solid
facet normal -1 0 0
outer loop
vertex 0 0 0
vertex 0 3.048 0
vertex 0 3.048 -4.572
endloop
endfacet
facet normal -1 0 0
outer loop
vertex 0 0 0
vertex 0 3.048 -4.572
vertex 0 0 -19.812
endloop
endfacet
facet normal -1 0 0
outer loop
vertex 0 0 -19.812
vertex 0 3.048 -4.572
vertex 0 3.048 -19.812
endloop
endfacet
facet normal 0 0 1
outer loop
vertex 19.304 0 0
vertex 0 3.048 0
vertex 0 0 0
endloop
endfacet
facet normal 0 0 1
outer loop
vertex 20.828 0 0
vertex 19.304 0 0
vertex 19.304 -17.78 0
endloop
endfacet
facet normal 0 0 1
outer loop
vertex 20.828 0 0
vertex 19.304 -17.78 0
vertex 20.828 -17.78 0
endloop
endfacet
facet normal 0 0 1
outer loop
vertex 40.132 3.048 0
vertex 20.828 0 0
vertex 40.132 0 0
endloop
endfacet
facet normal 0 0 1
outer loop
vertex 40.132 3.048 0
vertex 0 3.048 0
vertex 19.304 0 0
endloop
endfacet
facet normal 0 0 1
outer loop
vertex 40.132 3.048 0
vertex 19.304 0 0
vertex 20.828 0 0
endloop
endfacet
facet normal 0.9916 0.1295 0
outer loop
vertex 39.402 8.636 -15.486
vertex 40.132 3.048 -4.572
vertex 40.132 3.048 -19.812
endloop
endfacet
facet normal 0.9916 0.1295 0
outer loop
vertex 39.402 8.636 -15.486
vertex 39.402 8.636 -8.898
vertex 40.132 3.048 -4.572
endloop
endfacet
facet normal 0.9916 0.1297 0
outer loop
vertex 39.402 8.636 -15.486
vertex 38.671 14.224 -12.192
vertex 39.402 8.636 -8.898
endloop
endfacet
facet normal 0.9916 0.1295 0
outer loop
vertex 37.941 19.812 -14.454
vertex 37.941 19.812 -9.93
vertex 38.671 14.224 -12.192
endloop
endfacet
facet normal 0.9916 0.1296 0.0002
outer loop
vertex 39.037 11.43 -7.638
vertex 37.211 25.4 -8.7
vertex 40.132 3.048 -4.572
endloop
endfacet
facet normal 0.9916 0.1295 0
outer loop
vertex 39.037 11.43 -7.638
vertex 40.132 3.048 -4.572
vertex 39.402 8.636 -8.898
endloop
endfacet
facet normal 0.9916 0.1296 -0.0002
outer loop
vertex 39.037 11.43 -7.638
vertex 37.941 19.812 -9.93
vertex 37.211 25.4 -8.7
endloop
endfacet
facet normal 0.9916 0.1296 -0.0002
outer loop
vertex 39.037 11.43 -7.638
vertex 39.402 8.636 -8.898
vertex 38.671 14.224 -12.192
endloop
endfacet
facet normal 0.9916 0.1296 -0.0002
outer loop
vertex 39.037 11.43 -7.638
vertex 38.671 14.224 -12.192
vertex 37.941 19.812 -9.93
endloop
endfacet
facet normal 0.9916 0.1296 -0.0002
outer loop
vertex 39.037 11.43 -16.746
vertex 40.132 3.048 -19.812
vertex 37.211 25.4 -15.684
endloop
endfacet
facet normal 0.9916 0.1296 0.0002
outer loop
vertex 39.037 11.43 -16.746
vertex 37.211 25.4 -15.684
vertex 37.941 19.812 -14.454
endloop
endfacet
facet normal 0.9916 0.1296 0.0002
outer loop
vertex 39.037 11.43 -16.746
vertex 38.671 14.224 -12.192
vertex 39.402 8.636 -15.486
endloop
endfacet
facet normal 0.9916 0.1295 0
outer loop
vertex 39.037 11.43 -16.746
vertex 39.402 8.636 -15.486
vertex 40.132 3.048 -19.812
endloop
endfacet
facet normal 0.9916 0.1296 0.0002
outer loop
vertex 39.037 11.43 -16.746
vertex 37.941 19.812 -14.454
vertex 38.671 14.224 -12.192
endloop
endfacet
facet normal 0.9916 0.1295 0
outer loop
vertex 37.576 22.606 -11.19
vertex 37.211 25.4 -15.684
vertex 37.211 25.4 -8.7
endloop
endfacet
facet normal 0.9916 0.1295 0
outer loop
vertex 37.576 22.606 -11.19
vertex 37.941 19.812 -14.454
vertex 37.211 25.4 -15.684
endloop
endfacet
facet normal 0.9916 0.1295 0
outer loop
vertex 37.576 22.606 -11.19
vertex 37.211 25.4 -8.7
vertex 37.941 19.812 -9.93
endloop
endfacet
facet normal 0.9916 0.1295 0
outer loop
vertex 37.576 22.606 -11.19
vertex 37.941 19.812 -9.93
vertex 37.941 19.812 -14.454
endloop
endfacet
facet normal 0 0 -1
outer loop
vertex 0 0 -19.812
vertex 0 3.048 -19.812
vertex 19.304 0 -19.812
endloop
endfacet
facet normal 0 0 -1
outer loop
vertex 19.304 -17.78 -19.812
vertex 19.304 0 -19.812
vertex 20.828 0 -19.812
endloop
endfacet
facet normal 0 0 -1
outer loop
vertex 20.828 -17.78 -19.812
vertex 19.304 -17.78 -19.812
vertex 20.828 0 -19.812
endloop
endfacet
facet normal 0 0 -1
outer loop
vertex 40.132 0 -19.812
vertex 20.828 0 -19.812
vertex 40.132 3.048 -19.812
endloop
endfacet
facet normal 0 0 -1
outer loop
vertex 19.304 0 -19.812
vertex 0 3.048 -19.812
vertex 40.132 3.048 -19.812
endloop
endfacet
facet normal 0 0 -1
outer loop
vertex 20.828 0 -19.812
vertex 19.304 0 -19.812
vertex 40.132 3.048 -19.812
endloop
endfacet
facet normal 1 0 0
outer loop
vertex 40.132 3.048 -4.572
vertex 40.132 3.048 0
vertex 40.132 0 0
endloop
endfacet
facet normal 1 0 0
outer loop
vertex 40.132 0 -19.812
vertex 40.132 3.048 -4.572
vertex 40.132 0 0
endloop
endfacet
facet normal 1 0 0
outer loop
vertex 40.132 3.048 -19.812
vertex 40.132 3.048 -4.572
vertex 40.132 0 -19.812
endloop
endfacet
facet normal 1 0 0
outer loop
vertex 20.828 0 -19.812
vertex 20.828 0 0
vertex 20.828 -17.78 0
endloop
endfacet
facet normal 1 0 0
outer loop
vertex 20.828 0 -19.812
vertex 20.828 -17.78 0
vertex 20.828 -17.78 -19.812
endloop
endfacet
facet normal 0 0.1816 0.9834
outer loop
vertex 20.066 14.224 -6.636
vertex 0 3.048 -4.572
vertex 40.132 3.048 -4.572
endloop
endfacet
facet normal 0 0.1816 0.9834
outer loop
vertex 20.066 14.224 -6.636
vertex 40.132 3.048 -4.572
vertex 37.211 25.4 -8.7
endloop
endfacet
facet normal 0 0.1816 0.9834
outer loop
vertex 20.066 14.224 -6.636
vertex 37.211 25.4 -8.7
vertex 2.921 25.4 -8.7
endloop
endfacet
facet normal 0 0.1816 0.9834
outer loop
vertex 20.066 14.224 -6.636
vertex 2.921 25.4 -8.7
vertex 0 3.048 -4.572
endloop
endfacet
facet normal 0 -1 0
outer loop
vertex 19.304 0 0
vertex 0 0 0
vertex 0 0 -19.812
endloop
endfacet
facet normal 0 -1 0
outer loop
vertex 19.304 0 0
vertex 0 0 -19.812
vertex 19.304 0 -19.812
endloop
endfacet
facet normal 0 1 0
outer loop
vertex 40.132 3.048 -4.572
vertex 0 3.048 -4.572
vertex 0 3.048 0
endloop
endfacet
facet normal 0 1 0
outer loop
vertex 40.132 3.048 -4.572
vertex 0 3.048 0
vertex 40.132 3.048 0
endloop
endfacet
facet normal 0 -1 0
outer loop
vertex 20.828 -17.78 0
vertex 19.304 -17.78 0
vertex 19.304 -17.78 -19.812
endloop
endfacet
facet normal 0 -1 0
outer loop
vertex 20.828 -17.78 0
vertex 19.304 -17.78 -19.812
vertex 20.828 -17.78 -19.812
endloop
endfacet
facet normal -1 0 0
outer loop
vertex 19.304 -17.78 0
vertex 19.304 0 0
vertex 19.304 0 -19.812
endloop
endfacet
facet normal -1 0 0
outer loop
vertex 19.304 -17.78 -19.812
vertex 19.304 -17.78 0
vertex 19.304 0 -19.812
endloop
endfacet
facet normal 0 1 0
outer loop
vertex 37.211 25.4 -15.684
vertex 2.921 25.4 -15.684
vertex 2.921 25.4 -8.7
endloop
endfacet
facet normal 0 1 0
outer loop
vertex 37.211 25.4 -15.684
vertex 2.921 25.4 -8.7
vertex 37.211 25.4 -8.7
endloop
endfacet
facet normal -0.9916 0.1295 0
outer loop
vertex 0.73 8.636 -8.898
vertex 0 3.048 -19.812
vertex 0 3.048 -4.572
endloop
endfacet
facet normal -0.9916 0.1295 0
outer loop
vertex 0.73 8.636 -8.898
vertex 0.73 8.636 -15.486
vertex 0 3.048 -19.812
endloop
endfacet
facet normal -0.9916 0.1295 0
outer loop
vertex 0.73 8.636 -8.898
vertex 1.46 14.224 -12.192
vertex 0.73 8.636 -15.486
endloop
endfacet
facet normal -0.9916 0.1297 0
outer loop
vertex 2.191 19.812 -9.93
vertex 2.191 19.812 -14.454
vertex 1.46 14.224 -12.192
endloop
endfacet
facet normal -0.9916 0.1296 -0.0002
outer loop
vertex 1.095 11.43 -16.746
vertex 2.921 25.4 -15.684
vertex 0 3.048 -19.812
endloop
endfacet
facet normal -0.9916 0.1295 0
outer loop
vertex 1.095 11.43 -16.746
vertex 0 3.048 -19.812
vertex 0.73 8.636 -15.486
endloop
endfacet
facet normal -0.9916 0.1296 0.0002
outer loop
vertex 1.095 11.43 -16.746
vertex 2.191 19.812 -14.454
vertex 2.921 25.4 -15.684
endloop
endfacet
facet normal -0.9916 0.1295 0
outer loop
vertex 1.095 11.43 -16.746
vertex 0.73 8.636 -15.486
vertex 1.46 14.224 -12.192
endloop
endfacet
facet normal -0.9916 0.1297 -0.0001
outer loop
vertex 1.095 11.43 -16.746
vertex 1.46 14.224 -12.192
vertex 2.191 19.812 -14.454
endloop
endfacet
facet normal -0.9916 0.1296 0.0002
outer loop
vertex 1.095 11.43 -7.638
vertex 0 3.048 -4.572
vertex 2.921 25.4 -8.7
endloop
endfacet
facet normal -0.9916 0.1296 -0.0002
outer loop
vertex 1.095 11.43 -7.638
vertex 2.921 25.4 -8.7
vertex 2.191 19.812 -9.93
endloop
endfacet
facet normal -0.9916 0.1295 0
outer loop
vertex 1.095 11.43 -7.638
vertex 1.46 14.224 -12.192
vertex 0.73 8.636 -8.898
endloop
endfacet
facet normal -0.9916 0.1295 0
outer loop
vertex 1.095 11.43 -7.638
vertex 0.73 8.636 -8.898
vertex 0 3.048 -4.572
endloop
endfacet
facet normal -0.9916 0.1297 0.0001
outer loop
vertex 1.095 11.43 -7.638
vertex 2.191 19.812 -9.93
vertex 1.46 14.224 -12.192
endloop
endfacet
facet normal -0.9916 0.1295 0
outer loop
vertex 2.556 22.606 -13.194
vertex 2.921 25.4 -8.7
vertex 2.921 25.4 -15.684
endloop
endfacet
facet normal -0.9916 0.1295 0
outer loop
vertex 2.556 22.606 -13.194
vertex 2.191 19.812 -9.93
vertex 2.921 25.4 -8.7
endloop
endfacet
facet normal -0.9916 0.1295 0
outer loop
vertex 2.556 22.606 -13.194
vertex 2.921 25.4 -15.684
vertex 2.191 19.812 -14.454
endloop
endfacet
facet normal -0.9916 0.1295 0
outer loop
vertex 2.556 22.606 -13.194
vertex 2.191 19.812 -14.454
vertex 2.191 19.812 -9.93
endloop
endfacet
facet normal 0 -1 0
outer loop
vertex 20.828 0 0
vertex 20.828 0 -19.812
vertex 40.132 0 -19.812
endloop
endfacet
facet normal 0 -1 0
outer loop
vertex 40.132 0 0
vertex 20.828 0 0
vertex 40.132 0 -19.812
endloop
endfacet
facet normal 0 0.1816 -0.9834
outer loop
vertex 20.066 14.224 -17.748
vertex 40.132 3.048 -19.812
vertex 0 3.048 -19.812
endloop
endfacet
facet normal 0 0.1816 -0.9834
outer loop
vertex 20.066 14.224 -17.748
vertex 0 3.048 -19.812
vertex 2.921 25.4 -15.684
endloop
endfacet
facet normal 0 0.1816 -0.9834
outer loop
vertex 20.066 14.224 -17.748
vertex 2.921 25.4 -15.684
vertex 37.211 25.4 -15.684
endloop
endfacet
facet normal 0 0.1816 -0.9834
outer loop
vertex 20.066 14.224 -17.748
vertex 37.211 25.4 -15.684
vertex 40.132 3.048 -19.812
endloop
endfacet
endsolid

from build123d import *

# Parameters (mm, degrees)
SKETCH2_W           = 40.132
SKETCH2_H           = 19.812
BOSS_EXTRUDE1_DEPTH = 3.048
SKETCH3_W           = 40.132
SKETCH3_H           = 15.24
SKETCH4_W           = 34.29
SKETCH4_H           = 6.985
SKETCH5_W           = 1.524
SKETCH5_H           = 19.812
BOSS_EXTRUDE2_DEPTH = 17.78


with BuildPart() as part:
    # Sketch2 → Boss-Extrude1 (new body)
    with BuildSketch(Plane(origin=(0, 3.048, 0), x_dir=(1, 0, 0), z_dir=(0, 1, 0))):
        with Locations((20.066, 9.906)):
            Rectangle(SKETCH2_W, SKETCH2_H)
    extrude(amount=-BOSS_EXTRUDE1_DEPTH)

    # Sketch3 → Loft1 section 0
    with BuildSketch(Plane(origin=(0, 3.048, 0), x_dir=(1, 0, 0), z_dir=(0, 1, 0))):
        with Locations((20.066, 12.192)):
            Rectangle(SKETCH3_W, SKETCH3_H)
    # Sketch4 → Loft1 section 1
    with BuildSketch(Plane(origin=(0, 25.4, 0), x_dir=(1, 0, 0), z_dir=(0, 1, 0))):
        with Locations((20.066, 12.192)):
            Rectangle(SKETCH4_W, SKETCH4_H)
    loft()

    # Sketch5 → Boss-Extrude2 (add)
    with BuildSketch(Plane(origin=(0, 0, 0), x_dir=(1, 0, 0), z_dir=(0, 1, 0))):
        with Locations((20.066, 9.906)):
            Rectangle(SKETCH5_W, SKETCH5_H)
    extrude(amount=-BOSS_EXTRUDE2_DEPTH)


solid = part.part
